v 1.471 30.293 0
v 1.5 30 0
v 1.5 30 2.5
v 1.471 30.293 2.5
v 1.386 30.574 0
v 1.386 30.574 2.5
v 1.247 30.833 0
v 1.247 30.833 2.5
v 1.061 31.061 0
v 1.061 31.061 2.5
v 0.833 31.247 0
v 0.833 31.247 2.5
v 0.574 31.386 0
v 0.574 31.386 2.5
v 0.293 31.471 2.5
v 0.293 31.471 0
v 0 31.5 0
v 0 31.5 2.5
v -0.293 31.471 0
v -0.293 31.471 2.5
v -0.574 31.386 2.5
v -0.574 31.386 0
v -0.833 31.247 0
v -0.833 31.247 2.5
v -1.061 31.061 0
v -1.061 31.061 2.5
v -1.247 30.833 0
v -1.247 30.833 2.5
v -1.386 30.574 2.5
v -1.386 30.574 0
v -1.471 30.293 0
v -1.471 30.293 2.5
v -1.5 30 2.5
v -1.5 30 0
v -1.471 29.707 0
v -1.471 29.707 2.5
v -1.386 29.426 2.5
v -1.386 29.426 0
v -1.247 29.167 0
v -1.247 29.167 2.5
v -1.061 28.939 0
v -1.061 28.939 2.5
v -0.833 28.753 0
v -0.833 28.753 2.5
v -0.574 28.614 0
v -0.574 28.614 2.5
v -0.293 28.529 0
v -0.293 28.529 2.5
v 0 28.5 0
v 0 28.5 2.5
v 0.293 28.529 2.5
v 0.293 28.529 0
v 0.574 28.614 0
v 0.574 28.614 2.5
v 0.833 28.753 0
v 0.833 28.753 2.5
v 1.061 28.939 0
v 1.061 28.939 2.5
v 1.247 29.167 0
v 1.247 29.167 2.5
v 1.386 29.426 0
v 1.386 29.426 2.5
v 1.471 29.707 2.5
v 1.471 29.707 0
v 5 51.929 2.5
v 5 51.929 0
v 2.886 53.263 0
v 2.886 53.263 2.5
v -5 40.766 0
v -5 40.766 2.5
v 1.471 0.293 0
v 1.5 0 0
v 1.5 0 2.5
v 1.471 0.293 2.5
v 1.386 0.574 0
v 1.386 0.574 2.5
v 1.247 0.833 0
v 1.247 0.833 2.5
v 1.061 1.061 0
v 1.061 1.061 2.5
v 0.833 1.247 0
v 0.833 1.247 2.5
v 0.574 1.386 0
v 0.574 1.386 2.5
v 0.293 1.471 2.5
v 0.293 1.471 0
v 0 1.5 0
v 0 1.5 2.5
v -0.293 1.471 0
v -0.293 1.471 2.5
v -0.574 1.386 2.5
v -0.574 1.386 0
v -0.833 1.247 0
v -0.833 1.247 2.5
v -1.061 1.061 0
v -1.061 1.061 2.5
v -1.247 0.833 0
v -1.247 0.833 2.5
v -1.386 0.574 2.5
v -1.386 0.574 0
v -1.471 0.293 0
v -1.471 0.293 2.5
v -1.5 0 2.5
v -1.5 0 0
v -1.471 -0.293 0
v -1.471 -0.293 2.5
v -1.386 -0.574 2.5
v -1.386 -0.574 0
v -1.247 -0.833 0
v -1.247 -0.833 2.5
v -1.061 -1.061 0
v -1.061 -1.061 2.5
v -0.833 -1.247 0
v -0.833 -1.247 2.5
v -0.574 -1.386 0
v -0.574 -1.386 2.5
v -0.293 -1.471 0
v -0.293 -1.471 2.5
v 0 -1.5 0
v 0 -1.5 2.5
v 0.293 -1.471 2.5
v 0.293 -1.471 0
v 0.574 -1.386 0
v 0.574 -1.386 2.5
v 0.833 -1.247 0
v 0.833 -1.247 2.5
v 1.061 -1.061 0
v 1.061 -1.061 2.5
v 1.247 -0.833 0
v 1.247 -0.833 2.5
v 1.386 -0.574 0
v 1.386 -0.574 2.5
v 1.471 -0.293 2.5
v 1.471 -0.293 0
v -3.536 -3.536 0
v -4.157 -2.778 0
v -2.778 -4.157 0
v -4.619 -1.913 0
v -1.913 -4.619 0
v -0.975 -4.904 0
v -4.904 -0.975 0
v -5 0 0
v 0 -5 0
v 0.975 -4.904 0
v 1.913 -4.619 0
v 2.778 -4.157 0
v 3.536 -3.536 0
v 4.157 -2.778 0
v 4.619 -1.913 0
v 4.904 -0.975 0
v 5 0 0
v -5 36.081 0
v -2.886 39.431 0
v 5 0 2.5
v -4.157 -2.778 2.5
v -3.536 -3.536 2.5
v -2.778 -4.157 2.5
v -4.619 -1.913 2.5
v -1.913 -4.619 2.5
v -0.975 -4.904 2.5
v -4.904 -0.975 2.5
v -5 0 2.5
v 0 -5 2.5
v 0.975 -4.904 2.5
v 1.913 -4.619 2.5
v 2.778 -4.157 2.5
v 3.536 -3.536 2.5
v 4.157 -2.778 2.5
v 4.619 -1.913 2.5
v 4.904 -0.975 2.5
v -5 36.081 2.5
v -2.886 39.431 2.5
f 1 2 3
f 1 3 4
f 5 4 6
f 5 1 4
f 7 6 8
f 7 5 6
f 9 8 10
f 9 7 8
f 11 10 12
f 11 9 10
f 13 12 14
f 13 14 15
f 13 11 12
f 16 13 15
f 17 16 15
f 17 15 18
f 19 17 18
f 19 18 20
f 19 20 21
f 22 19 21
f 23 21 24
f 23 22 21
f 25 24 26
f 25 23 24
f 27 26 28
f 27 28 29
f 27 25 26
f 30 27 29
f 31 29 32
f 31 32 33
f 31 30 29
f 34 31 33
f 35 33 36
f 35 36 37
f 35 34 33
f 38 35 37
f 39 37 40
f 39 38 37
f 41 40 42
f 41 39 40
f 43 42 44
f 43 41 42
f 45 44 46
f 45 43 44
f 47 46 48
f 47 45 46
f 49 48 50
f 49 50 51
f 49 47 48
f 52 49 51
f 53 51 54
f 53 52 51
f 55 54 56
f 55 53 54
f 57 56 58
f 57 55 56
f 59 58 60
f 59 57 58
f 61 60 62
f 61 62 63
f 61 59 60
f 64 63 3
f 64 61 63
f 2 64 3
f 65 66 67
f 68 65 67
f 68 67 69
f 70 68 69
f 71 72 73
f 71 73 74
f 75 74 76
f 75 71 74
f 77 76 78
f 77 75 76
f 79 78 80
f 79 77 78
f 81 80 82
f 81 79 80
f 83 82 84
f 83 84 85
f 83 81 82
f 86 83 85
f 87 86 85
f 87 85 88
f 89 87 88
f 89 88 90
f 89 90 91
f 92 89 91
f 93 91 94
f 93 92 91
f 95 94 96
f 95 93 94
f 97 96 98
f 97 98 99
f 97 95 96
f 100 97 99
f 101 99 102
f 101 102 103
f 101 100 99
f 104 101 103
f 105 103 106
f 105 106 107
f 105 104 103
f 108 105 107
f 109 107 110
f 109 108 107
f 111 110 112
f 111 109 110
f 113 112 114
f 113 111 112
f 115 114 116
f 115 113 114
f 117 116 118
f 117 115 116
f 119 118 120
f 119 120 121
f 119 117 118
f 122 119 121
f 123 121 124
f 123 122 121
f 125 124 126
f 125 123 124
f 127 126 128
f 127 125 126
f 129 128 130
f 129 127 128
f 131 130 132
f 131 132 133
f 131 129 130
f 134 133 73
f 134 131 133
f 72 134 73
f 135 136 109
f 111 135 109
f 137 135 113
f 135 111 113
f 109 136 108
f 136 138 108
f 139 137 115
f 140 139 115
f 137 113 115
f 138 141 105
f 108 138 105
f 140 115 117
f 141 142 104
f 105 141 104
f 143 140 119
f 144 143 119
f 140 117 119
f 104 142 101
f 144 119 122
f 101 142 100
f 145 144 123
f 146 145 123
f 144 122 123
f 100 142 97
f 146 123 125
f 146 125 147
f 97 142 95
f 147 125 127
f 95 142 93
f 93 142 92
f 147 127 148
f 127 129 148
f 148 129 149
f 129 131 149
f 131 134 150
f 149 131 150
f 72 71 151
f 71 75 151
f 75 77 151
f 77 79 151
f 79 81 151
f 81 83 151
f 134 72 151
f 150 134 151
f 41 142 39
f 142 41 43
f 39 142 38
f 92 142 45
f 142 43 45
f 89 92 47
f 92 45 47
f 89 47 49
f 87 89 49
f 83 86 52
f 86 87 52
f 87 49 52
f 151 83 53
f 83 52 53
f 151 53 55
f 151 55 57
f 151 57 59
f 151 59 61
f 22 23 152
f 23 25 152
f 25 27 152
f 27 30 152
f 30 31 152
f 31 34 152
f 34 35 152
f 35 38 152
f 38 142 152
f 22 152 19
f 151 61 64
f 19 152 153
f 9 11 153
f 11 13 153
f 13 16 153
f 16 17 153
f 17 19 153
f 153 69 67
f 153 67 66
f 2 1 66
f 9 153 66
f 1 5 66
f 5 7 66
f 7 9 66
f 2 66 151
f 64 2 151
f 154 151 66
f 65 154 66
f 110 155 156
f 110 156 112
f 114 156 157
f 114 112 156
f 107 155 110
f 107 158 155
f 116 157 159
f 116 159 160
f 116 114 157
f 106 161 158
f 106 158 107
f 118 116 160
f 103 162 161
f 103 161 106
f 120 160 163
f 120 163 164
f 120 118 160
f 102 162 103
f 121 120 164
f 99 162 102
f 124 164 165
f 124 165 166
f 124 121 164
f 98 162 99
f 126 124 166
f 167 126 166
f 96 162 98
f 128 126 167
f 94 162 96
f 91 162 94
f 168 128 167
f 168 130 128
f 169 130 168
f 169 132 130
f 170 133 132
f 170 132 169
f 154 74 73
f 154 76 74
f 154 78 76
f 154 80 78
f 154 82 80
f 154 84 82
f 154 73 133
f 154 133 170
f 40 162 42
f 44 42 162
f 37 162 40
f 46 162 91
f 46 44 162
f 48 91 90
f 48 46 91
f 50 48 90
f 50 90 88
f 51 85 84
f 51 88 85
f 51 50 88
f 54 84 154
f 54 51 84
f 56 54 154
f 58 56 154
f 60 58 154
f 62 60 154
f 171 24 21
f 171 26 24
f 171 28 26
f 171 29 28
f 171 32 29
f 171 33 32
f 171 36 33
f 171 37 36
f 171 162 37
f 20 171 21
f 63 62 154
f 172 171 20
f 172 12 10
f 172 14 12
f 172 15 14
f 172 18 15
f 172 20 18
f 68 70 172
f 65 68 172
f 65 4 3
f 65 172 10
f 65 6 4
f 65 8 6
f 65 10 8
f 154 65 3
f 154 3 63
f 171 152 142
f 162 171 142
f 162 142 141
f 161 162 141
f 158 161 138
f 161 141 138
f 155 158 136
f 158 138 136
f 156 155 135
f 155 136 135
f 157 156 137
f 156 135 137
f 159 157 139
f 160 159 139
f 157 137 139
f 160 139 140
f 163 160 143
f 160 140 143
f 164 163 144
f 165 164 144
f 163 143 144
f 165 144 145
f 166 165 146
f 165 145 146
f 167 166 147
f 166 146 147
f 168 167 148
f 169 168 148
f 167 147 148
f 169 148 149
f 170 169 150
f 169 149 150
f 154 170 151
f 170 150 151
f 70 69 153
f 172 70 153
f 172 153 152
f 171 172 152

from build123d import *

# Parameters (mm, degrees)
CROQUIS1_R              = 1.5
SALIENTE_EXTRUIR1_DEPTH = 2.5


with BuildPart() as part:
    # Croquis1 → Saliente-Extruir1 (new body)
    with BuildSketch(Plane.XY):
        with BuildLine():
            Line((-5, 36.080727307), (-5, 0))
            ThreePointArc((-5, 0), (0, -5), (5, 0))
            Line((5, 0), (5, 51.928629296))
            Line((5, 51.928629296), (2.885723707, 53.262734147))
            Line((2.885723707, 53.262734147), (-5, 40.765516506))
            Line((-5, 40.765516506), (-2.885723707, 39.431411654))
            Line((-2.885723707, 39.431411654), (-5, 36.080727307))
        make_face()
        Circle(CROQUIS1_R, mode=Mode.SUBTRACT)
        with Locations((0, 30)):
            Circle(CROQUIS1_R, mode=Mode.SUBTRACT)
    extrude(amount=SALIENTE_EXTRUIR1_DEPTH)


solid = part.part
